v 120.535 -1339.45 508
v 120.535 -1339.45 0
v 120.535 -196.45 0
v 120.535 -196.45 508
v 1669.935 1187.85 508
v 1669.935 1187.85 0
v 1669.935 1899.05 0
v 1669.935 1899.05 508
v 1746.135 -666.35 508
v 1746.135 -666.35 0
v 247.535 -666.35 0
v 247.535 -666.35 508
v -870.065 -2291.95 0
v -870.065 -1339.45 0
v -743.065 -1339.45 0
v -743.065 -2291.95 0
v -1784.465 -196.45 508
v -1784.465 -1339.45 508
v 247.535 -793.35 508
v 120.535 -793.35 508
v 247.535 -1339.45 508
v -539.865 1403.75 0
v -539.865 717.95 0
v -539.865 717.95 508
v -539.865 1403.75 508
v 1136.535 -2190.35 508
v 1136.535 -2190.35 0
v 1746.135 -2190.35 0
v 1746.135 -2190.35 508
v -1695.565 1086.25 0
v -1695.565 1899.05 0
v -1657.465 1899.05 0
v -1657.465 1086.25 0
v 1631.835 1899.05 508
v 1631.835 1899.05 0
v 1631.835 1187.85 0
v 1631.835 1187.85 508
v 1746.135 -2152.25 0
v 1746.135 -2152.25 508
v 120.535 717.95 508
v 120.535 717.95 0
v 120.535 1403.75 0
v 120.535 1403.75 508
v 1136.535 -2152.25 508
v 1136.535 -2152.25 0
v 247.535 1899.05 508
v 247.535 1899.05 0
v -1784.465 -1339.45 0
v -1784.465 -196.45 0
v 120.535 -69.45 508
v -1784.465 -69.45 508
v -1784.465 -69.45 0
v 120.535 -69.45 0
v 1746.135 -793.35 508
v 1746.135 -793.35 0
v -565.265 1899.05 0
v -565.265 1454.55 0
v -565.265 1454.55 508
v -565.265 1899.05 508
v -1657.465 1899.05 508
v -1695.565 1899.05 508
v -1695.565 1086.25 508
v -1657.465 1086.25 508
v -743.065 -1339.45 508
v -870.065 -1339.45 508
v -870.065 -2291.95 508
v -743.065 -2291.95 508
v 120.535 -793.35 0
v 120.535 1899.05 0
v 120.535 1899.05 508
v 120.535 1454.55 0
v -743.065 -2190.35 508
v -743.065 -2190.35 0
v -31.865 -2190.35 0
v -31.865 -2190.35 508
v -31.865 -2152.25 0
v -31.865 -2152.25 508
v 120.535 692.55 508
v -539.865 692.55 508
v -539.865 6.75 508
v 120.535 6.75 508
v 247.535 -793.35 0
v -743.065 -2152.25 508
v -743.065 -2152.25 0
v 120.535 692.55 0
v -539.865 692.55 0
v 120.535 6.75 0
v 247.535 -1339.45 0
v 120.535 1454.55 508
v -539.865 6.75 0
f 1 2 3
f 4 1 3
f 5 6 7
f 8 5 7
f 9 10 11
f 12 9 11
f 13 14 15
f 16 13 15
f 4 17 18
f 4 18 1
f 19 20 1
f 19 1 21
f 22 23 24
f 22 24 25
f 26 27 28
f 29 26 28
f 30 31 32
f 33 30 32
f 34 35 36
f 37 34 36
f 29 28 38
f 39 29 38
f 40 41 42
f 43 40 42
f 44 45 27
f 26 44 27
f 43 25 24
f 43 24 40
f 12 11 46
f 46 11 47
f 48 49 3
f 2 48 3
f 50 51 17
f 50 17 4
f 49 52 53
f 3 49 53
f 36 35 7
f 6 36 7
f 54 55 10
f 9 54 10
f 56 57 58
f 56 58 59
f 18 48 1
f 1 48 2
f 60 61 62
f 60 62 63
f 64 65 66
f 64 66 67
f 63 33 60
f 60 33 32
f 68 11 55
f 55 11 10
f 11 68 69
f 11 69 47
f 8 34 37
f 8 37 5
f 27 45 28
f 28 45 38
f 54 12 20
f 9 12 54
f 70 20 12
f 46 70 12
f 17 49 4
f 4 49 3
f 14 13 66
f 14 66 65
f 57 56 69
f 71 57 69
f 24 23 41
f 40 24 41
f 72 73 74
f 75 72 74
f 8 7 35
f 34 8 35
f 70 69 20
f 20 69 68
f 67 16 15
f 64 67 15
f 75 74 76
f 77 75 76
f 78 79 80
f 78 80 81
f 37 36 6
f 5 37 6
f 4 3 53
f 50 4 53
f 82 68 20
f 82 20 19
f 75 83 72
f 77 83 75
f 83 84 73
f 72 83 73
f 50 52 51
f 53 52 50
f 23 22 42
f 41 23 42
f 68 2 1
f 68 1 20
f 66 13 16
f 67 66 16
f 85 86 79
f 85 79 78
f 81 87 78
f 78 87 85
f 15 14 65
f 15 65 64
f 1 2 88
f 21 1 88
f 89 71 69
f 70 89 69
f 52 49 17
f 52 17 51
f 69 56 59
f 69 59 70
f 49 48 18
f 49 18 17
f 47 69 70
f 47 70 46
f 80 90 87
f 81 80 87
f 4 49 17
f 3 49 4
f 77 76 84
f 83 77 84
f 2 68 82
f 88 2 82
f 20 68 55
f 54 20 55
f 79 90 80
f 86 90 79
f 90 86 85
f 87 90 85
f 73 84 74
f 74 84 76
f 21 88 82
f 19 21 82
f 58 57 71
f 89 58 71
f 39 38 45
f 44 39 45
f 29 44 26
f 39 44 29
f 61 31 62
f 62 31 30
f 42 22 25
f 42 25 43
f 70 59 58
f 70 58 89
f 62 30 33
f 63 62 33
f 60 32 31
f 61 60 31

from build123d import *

# Parameters (mm, degrees)
F9_W      = 1905
F9_H      = 1143
F12_DEPTH = 508
F8_W      = 1905
F8_H      = 127
F7_W      = 127
F7_H      = 952.5
F4_W      = 660.4
F4_H      = 685.8
F1_W      = 685.8
F1_H      = 444.5
F10_W     = 127
F10_H     = 546.1
F2_W      = 127
F2_H      = 2565.4
F13_DEPTH = 508


# Not quite as in the source:
# - the program builds the solid bodies; features that only make, move or delete a surface that nothing else refers to are left out


with BuildPart() as f12:
    # F9 (on face) → F12 (new body)
    with BuildSketch(Plane.XY):
        with Locations((-831.9651317239, -767.9497311732)):
            Rectangle(F9_W, F9_H)
    extrude(amount=F12_DEPTH)


with BuildPart() as f12b:
    # F8 (on Top) → F12, piece 2 (new body)
    with BuildSketch(Plane.XY):
        with Locations((-831.9651317239, -132.9497311732)):
            Rectangle(F8_W, F8_H)
    extrude(amount=F12_DEPTH)


with BuildPart() as f12c:
    # F7 (on Top) → F12, piece 3 (new body)
    with BuildSketch(Plane.XY):
        with Locations((-806.5651317239, -1815.6997311732)):
            Rectangle(F7_W, F7_H)
    extrude(amount=F12_DEPTH)


with BuildPart() as f12d:
    # F6 (on Top) → F12, piece 4 (new body)
    with BuildSketch(Plane.XY):
        with BuildLine():
            Line((-1657.4651317239, 1899.0502688268), (-1695.5651317239, 1899.0502688268))
            Line((-1695.5651317239, 1899.0502688268), (-1695.5651317239, 1086.2502688268))
            ThreePointArc((-1695.5651317239, 1086.2502688268), (-1676.5098944488, 1086.4736644797), (-1657.4651317239, 1087.1437286389))
            Line((-1657.4651317239, 1087.1437286389), (-1657.4651317239, 1899.0502688268))
        make_face()
        with BuildLine():
            ThreePointArc((-1657.4651317239, 1087.1437286389), (-1676.5098944488, 1086.4736644797), (-1695.5651317239, 1086.2502688268))
            Line((-1695.5651317239, 1086.2502688268), (-1657.4651317239, 1086.2502688268))
            Line((-1657.4651317239, 1086.2502688268), (-1657.4651317239, 1087.1437286389))
        make_face()
    extrude(amount=F12_DEPTH)


with BuildPart() as f12e:
    # F5 (on Top) → F12, piece 5 (new body)
    with BuildSketch(Plane.XY):
        with BuildLine():
            Line((1669.9348682761, 1187.8502688268), (1669.9348682761, 1899.0502688268))
            Line((1669.9348682761, 1899.0502688268), (1631.8348682761, 1899.0502688268))
            Line((1631.8348682761, 1899.0502688268), (1631.8348682761, 1188.871537802))
            ThreePointArc((1631.8348682761, 1188.871537802), (1650.8780257365, 1188.1056319159), (1669.9348682761, 1187.8502688268))
        make_face()
        with BuildLine():
            Line((1631.8348682761, 1187.8502688268), (1669.9348682761, 1187.8502688268))
            ThreePointArc((1669.9348682761, 1187.8502688268), (1650.8780257365, 1188.1056319159), (1631.8348682761, 1188.871537802))
            Line((1631.8348682761, 1188.871537802), (1631.8348682761, 1187.8502688268))
        make_face()
    extrude(amount=F12_DEPTH)


with BuildPart() as f12f:
    # F4 (on Top) → F12, piece 6 (new body)
    with BuildSketch(Plane.XY):
        with Locations((-209.6651317239, 349.6502688268)):
            Rectangle(F4_W, F4_H)
    extrude(amount=F12_DEPTH)


with BuildPart() as f12g:
    # F4 (on Top) → F12, piece 7 (new body)
    with BuildSketch(Plane.XY):
        with Locations((-209.6651317239, 1060.8502688268)):
            Rectangle(F4_W, F4_H)
    extrude(amount=F12_DEPTH)


with BuildPart() as f12h:
    # F3 (on Top) → F12, piece 8 (new body)
    with BuildSketch(Plane.XY):
        with BuildLine():
            Line((1137.7266582723, -2152.2497311732), (1136.5348682761, -2152.2497311732))
            Line((1136.5348682761, -2152.2497311732), (1136.5348682761, -2190.3497311732))
            ThreePointArc((1136.5348682761, -2190.3497311732), (1136.832888623, -2171.2904134821), (1137.7266582723, -2152.2497311732))
        make_face()
        with BuildLine():
            Line((1746.1348682761, -2152.2497311732), (1137.7266582723, -2152.2497311732))
            ThreePointArc((1137.7266582723, -2152.2497311732), (1136.832888623, -2171.2904134821), (1136.5348682761, -2190.3497311732))
            Line((1136.5348682761, -2190.3497311732), (1746.1348682761, -2190.3497311732))
            Line((1746.1348682761, -2190.3497311732), (1746.1348682761, -2152.2497311732))
        make_face()
    extrude(amount=F12_DEPTH)


with BuildPart() as f12i:
    # F1 (on Top) → F12, piece 9 (new body)
    with BuildSketch(Plane.XY):
        with Locations((-222.3651317239, 1676.8002688268)):
            Rectangle(F1_W, F1_H)
    extrude(amount=F12_DEPTH)


with BuildPart() as f12j:
    # F10 (on face) → F12, piece 10 (new body)
    with BuildSketch(Plane.XY):
        with Locations((184.0348682761, -1066.3997311732)):
            Rectangle(F10_W, F10_H)
    extrude(amount=F12_DEPTH)


with BuildPart() as f12k:
    # F11 (on face) → F12, piece 11 (new body)
    with BuildSketch(Plane.XY):
        with BuildLine():
            Line((-743.0651317239, -2152.2497311732), (-743.0651317239, -2190.3497311732))
            Line((-743.0651317239, -2190.3497311732), (-31.8651317239, -2190.3497311732))
            ThreePointArc((-31.8651317239, -2190.3497311732), (-32.1204948129, -2171.2928886335), (-32.8864006991, -2152.2497311732))
            Line((-32.8864006991, -2152.2497311732), (-743.0651317239, -2152.2497311732))
        make_face()
        with BuildLine():
            ThreePointArc((-32.8864006991, -2152.2497311732), (-32.1204948129, -2171.2928886335), (-31.8651317239, -2190.3497311732))
            Line((-31.8651317239, -2190.3497311732), (-31.8651317239, -2152.2497311732))
            Line((-31.8651317239, -2152.2497311732), (-32.8864006991, -2152.2497311732))
        make_face()
    extrude(amount=F12_DEPTH)


with BuildPart() as f13:
    # F2 (on Top) → F13 (new body)
    with BuildSketch(Plane.XY):
        with Locations((184.0348682761, 616.3502688268)):
            Rectangle(F2_W, F2_H)
        Polygon((247.5348682761, -793.3497311732), (1746.1348682761, -793.3497311732), (1746.1348682761, -666.3497311732), (247.5348682761, -666.3497311732), (120.5348682761, -666.3497311732), (120.5348682761, -793.3497311732), align=None)
    extrude(amount=F13_DEPTH)


solid = Compound([f12.part, f12b.part, f12c.part, f12d.part, f12e.part, f12f.part, f12g.part, f12h.part, f12i.part, f12j.part, f12k.part, f13.part])
